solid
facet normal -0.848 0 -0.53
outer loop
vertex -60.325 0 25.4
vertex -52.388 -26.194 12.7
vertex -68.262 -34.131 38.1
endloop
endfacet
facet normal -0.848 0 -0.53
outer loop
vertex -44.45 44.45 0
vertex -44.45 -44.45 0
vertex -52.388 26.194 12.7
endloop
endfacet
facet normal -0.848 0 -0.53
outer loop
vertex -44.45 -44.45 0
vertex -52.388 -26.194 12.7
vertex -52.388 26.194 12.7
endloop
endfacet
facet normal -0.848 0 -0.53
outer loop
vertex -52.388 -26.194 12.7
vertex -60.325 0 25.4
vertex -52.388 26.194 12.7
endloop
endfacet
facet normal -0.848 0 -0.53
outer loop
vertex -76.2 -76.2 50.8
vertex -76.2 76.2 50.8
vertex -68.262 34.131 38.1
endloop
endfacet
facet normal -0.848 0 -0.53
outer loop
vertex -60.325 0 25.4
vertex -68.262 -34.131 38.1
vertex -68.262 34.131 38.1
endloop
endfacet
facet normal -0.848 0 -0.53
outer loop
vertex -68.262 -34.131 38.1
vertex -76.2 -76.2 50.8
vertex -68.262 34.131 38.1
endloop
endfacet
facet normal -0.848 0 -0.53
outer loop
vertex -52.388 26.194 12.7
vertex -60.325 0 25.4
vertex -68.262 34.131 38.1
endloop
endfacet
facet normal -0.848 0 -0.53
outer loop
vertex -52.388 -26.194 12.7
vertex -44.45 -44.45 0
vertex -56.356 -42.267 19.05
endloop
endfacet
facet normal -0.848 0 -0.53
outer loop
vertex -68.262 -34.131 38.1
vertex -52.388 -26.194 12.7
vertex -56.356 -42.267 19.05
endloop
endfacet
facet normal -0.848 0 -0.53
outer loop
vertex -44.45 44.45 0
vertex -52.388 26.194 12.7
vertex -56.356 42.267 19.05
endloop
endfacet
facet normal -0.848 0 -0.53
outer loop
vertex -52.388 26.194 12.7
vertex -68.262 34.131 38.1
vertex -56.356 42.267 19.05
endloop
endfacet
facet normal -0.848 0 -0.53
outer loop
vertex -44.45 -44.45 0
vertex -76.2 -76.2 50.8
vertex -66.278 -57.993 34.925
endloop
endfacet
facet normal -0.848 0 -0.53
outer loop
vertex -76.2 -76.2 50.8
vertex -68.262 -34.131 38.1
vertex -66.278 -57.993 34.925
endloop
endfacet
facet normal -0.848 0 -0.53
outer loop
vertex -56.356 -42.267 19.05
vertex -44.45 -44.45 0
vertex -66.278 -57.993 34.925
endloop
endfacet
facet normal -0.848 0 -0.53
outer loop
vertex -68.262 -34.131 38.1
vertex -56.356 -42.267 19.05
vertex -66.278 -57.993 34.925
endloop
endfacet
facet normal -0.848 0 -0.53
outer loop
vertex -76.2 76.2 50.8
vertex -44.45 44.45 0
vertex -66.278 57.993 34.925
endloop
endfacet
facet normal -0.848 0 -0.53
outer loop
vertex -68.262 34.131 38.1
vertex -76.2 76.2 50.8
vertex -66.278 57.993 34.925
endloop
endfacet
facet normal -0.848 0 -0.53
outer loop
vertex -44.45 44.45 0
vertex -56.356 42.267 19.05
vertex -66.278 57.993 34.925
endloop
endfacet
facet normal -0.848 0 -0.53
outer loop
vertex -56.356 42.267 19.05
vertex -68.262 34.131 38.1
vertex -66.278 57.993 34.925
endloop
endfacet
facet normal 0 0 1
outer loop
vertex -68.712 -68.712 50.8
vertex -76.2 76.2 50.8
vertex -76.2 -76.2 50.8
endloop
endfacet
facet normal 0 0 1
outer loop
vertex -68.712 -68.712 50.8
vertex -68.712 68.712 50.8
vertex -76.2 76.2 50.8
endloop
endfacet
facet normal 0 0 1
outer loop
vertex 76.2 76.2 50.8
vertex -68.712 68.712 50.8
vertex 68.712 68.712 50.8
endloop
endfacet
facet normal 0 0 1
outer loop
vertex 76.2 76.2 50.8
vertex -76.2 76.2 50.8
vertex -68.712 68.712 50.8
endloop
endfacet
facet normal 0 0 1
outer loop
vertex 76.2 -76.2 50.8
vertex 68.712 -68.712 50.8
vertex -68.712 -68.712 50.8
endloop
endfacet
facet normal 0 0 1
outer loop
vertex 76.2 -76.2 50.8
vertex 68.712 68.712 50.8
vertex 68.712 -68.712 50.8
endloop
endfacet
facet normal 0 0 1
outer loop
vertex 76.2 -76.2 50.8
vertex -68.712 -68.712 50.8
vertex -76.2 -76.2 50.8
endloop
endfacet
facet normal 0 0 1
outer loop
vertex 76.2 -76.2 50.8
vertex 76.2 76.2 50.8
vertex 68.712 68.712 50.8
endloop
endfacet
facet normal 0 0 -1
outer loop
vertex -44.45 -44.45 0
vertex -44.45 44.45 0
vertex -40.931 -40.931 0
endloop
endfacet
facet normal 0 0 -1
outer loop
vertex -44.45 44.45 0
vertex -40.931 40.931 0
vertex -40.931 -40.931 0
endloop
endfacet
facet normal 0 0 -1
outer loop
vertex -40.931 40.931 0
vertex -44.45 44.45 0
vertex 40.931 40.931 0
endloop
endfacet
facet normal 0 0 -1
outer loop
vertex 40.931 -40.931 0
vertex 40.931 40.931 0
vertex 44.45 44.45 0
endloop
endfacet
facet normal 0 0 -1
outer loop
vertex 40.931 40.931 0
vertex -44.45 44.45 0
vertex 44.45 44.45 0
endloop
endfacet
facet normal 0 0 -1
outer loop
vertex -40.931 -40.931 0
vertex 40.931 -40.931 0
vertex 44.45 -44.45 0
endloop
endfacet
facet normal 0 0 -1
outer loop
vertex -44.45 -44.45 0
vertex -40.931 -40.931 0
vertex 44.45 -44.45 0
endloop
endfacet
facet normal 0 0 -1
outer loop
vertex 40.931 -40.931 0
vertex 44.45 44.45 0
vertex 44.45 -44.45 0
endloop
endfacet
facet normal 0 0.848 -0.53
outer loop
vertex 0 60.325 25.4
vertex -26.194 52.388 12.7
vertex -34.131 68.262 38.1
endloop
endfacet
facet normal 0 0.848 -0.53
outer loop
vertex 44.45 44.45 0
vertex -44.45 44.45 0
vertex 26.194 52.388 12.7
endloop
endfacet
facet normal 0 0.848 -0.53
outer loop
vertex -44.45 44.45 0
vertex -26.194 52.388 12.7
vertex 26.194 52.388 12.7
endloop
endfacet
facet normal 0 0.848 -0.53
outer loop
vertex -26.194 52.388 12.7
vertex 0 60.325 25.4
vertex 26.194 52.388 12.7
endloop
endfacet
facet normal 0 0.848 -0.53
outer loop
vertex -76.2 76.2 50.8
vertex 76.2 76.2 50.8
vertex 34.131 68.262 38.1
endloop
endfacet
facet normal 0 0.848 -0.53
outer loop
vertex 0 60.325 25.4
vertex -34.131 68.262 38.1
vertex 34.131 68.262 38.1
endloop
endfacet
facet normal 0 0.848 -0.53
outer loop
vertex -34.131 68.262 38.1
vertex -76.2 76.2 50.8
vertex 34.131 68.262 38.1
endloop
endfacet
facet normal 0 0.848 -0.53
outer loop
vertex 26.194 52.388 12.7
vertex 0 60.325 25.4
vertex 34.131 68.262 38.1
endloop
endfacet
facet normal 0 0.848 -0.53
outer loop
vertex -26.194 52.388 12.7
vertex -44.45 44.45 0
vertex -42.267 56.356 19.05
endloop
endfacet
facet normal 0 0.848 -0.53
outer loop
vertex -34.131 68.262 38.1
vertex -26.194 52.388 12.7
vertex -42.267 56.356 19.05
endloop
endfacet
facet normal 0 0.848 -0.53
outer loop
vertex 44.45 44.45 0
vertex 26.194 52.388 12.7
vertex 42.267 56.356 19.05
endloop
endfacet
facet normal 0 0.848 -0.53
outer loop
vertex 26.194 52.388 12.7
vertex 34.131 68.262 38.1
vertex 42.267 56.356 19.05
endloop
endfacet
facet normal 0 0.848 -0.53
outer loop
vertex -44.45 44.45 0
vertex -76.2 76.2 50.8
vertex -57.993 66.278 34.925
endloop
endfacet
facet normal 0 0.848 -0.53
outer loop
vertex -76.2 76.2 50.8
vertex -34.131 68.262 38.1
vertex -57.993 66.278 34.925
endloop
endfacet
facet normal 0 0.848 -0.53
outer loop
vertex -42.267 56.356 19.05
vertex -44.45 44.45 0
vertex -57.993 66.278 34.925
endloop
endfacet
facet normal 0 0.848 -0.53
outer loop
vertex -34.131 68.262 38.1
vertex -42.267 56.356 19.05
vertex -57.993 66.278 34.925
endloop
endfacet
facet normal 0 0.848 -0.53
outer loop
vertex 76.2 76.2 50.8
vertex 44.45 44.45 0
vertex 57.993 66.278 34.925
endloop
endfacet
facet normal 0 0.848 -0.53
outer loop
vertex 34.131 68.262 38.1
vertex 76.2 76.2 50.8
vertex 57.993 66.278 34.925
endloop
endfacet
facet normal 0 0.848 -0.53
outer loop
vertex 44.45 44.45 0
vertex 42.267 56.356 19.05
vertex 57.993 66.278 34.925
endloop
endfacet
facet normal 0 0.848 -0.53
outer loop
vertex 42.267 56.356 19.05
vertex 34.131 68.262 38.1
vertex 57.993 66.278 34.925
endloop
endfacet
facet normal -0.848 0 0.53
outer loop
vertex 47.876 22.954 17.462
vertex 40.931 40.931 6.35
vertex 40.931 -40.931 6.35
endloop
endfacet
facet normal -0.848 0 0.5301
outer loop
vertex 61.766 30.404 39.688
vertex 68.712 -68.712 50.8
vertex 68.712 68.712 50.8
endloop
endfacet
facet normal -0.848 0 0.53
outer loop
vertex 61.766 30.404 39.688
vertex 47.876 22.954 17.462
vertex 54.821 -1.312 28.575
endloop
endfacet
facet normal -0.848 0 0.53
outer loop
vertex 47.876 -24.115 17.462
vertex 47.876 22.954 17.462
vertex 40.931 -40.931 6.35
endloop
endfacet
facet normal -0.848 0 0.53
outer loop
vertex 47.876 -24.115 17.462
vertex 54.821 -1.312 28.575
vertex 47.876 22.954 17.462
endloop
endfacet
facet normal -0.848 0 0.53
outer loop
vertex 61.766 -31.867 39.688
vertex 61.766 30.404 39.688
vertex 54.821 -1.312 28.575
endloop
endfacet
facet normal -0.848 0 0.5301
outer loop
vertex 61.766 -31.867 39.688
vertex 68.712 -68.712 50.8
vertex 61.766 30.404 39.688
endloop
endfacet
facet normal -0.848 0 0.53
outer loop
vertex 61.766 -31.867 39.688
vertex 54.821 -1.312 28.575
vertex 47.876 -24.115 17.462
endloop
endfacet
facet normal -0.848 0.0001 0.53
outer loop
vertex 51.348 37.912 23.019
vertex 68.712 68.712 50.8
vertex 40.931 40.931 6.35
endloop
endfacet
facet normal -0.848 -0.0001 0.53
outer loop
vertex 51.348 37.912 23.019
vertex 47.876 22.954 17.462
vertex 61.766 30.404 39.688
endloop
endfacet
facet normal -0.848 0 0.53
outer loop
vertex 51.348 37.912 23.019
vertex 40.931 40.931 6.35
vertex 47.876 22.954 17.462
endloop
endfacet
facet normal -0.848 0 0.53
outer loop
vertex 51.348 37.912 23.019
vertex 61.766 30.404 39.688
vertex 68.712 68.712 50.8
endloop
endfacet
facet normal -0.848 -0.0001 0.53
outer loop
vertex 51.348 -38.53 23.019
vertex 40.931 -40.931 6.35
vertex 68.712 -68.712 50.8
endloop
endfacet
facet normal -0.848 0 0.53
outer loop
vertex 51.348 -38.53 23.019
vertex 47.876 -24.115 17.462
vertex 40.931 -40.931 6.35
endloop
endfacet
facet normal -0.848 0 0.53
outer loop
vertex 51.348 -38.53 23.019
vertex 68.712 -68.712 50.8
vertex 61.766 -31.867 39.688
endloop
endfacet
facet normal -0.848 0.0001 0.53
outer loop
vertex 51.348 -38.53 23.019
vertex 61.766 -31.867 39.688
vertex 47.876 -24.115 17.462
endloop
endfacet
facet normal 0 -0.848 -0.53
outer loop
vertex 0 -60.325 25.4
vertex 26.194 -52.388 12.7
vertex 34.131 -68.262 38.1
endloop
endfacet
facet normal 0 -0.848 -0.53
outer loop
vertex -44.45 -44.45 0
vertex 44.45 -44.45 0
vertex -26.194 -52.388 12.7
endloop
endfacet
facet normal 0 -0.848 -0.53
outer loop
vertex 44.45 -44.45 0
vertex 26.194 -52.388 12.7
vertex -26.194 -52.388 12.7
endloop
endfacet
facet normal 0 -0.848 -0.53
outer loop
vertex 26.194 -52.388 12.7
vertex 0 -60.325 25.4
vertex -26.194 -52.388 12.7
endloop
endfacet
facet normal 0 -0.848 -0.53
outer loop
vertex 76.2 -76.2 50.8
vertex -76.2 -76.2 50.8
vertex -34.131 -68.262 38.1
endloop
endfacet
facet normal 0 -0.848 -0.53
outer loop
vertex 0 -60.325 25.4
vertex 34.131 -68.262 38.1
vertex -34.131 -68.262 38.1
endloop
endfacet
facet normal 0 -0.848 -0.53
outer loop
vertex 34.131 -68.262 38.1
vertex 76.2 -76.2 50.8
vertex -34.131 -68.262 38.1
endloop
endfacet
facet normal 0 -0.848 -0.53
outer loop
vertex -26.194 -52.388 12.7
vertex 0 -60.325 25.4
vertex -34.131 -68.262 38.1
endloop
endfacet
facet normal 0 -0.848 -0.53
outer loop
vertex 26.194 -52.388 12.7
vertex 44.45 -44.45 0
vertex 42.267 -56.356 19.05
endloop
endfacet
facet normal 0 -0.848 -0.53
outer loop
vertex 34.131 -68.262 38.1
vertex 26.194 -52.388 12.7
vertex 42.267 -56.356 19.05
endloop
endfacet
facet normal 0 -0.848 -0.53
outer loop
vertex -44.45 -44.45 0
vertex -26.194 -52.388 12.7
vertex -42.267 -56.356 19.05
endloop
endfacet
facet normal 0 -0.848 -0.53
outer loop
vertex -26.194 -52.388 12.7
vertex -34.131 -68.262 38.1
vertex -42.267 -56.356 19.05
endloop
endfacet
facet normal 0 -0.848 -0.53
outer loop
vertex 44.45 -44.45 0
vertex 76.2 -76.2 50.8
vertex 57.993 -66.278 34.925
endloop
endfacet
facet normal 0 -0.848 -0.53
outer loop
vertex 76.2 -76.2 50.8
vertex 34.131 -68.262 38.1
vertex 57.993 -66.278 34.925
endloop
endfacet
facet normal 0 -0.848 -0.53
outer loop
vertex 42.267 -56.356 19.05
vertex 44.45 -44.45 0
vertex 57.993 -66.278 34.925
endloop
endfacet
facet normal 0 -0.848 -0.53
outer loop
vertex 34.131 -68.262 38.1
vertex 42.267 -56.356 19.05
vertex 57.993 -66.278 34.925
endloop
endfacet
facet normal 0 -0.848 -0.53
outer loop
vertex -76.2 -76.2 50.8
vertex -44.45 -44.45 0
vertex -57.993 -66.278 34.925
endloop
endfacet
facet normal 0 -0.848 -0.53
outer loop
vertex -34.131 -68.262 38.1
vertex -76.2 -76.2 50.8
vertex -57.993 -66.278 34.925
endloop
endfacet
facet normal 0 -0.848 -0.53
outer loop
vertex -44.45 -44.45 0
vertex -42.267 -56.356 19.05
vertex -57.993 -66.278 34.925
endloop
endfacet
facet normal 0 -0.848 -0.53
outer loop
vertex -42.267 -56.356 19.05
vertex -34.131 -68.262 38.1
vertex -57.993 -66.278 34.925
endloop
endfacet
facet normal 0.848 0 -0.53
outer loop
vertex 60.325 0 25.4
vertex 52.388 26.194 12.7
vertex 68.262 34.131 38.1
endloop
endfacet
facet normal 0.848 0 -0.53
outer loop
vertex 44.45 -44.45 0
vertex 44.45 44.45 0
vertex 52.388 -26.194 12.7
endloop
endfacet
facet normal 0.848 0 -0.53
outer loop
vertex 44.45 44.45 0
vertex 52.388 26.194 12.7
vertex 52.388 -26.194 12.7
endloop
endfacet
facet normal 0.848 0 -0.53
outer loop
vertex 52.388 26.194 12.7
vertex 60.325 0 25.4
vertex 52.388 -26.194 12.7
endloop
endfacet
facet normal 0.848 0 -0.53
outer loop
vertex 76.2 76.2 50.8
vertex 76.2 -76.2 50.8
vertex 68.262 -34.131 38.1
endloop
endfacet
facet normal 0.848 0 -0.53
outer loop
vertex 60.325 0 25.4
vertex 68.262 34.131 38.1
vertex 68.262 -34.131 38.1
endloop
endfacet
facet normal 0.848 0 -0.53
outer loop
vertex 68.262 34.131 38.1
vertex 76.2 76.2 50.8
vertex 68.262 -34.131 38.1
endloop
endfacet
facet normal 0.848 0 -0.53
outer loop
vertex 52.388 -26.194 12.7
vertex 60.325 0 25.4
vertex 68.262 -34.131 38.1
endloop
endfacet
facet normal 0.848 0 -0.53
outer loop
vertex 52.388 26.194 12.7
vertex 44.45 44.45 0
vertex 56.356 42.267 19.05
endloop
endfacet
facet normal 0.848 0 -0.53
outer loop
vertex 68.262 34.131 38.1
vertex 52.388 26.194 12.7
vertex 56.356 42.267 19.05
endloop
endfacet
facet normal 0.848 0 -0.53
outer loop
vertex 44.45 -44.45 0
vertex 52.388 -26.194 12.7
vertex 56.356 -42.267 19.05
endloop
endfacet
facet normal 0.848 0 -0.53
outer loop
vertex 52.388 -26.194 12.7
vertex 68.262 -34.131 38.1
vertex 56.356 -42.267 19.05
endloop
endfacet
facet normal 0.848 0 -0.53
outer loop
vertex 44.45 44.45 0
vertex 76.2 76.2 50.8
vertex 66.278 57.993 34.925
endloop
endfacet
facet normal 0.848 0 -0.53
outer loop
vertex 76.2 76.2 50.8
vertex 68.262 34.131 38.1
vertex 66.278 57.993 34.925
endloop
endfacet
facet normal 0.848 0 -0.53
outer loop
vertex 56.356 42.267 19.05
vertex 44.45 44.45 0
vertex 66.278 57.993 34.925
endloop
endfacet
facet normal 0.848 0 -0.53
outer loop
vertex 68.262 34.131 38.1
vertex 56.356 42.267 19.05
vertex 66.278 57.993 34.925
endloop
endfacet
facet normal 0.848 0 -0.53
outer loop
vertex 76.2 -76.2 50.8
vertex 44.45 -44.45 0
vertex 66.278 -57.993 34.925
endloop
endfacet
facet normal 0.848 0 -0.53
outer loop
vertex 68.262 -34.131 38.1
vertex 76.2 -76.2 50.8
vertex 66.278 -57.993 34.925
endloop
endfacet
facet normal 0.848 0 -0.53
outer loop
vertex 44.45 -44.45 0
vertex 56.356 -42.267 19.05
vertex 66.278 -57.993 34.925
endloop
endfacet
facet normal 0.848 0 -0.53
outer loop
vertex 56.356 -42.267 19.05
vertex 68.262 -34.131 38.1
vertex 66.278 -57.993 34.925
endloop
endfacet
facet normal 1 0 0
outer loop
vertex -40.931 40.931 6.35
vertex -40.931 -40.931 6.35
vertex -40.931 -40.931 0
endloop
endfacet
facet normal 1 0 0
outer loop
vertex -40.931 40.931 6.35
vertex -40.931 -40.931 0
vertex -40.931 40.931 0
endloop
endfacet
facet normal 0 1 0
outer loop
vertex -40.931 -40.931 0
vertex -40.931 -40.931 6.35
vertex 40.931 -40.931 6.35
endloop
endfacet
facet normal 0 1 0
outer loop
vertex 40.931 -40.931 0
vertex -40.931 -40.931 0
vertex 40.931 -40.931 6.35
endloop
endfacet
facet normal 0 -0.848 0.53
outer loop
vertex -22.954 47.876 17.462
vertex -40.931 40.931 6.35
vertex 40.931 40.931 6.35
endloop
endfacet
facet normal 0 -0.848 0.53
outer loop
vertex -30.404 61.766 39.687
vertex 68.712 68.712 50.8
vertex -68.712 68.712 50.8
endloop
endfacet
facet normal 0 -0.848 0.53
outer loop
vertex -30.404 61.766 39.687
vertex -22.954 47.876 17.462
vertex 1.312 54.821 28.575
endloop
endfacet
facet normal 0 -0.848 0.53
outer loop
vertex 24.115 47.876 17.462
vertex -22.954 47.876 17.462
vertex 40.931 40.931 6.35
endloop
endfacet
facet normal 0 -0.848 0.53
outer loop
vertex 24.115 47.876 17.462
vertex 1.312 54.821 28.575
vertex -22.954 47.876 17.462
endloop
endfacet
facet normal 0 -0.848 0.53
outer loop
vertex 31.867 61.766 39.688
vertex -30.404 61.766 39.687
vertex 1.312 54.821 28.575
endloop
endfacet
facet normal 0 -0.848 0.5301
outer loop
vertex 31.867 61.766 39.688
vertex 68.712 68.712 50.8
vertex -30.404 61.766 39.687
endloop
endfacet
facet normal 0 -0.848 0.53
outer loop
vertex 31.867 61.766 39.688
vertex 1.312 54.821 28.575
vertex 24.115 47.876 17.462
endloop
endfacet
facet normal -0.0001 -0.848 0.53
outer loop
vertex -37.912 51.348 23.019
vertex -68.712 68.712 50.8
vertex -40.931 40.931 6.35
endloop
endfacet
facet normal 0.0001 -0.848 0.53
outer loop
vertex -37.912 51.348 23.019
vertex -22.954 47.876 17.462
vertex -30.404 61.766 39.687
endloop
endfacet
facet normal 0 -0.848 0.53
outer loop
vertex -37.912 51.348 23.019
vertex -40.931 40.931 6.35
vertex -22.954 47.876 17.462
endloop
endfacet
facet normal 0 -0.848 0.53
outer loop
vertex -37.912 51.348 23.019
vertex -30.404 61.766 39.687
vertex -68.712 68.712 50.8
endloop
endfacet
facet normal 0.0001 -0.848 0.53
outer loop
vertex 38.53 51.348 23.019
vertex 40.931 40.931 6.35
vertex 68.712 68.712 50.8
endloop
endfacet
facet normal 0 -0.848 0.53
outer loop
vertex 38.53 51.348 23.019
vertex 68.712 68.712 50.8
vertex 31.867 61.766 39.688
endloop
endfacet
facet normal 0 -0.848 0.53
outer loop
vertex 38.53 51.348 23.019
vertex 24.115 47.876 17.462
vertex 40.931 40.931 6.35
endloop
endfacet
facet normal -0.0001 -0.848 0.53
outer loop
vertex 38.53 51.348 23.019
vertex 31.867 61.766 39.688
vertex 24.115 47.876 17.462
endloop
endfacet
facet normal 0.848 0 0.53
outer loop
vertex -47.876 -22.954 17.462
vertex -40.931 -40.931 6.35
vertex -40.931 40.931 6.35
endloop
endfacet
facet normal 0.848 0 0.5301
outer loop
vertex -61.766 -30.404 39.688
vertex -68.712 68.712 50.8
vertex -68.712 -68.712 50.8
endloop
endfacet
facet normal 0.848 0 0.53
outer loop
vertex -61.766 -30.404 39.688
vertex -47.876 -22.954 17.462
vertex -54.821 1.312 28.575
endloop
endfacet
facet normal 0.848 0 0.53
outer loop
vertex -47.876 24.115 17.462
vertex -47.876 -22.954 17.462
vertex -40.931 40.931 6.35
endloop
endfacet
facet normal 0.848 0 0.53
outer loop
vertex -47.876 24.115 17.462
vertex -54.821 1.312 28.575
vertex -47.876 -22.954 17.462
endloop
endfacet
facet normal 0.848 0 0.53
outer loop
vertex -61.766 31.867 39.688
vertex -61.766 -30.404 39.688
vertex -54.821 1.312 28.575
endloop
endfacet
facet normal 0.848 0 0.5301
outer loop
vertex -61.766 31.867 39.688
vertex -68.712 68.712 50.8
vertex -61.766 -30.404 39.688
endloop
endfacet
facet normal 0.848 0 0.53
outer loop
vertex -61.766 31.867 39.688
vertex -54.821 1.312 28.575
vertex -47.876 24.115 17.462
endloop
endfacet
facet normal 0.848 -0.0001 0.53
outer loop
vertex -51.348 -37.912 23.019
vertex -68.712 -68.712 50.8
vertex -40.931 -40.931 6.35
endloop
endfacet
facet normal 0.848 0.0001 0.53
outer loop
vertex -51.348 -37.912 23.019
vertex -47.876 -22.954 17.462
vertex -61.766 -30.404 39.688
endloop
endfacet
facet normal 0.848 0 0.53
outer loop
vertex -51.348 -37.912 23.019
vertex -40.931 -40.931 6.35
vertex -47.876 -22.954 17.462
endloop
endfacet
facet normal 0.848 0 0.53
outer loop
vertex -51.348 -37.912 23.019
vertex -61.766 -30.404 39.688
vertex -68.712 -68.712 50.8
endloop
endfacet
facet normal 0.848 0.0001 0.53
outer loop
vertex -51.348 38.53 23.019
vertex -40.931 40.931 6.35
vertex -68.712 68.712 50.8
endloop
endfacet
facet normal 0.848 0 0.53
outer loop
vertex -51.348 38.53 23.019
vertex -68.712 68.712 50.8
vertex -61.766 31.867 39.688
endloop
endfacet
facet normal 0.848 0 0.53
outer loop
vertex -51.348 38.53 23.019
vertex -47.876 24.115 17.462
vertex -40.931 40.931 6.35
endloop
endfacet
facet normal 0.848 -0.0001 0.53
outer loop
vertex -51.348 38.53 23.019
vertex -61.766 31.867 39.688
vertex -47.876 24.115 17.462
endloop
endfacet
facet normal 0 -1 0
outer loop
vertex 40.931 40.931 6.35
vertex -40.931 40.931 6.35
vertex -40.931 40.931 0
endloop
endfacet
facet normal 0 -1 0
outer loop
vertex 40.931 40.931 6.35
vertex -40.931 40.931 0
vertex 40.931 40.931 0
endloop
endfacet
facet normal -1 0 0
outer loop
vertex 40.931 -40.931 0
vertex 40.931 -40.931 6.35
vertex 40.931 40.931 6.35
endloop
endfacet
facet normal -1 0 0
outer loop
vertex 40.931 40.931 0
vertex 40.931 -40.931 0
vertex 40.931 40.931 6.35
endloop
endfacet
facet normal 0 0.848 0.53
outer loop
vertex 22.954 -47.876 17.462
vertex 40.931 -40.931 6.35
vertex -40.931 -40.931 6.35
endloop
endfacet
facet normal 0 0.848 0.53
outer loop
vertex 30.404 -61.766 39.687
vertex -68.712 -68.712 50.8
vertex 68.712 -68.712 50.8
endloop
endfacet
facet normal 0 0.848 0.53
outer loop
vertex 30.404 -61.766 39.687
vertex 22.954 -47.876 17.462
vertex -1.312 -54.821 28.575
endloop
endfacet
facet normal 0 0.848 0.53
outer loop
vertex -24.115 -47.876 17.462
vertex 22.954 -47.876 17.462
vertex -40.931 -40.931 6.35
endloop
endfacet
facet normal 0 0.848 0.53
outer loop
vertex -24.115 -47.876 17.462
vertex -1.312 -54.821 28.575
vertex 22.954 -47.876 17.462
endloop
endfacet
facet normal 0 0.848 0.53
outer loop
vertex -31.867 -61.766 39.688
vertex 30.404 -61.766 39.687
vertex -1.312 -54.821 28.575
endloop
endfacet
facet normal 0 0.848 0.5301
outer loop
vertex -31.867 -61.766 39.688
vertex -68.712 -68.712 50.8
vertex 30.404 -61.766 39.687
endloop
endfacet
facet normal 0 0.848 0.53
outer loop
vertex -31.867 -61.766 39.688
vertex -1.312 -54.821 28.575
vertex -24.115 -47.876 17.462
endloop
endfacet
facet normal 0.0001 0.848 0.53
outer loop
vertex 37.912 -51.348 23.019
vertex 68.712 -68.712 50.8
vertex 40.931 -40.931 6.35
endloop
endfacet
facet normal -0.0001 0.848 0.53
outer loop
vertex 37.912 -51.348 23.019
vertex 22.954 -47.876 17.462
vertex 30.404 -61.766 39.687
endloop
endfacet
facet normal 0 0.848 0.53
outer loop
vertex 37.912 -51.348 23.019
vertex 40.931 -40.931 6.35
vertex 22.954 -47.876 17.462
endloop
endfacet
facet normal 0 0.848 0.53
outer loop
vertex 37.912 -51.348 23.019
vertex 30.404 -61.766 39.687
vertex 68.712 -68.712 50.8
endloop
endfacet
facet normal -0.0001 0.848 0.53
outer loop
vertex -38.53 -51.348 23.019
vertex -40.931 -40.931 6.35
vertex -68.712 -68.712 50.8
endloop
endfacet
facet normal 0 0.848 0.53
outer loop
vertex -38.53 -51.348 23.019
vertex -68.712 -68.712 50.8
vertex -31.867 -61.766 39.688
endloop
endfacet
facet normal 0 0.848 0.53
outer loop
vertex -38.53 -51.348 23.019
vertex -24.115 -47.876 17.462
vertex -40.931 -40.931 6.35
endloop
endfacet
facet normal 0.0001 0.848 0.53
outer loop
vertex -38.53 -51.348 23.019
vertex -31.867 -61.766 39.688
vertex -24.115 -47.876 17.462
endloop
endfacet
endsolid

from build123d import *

# Parameters (mm, degrees)
SHELL1_T           = -6.35
SKETCH4_W          = 81.861054952
SKETCH4_H          = 81.861054952
CUT_EXTRUDE1_DEPTH = 117.570504586


with BuildPart() as part:
    # Sketch1 → Loft1 section 0
    with BuildSketch(Plane.XY):
        with BuildLine():
            Line((-44.45, 44.45), (44.45, 44.45))
            Line((44.45, 44.45), (44.45, -44.45))
            Line((44.45, -44.45), (-44.45, -44.45))
            Line((-44.45, -44.45), (-44.45, 44.45))
        make_face()
    # Sketch2 → Loft1 section 1
    with BuildSketch(Plane.XY.offset(50.8)):
        with BuildLine():
            Line((-76.2, 76.2), (76.2, 76.2))
            Line((76.2, 76.2), (76.2, -76.2))
            Line((76.2, -76.2), (-76.2, -76.2))
            Line((-76.2, -76.2), (-76.2, 76.2))
        make_face()
    loft()

    # Shell1
    shell1_openings = [part.faces().sort_by_distance(p)[0] for p in [
        (0, 0, 50.8),
    ]]
    offset(amount=SHELL1_T, openings=shell1_openings, kind=Kind.INTERSECTION)

    # Sketch4 → Cut-Extrude1 (cut, through all)
    with BuildSketch(Plane.XY.offset(6.35)):
        Rectangle(SKETCH4_W, SKETCH4_H)
    extrude(amount=-CUT_EXTRUDE1_DEPTH, mode=Mode.SUBTRACT)


solid = part.part
